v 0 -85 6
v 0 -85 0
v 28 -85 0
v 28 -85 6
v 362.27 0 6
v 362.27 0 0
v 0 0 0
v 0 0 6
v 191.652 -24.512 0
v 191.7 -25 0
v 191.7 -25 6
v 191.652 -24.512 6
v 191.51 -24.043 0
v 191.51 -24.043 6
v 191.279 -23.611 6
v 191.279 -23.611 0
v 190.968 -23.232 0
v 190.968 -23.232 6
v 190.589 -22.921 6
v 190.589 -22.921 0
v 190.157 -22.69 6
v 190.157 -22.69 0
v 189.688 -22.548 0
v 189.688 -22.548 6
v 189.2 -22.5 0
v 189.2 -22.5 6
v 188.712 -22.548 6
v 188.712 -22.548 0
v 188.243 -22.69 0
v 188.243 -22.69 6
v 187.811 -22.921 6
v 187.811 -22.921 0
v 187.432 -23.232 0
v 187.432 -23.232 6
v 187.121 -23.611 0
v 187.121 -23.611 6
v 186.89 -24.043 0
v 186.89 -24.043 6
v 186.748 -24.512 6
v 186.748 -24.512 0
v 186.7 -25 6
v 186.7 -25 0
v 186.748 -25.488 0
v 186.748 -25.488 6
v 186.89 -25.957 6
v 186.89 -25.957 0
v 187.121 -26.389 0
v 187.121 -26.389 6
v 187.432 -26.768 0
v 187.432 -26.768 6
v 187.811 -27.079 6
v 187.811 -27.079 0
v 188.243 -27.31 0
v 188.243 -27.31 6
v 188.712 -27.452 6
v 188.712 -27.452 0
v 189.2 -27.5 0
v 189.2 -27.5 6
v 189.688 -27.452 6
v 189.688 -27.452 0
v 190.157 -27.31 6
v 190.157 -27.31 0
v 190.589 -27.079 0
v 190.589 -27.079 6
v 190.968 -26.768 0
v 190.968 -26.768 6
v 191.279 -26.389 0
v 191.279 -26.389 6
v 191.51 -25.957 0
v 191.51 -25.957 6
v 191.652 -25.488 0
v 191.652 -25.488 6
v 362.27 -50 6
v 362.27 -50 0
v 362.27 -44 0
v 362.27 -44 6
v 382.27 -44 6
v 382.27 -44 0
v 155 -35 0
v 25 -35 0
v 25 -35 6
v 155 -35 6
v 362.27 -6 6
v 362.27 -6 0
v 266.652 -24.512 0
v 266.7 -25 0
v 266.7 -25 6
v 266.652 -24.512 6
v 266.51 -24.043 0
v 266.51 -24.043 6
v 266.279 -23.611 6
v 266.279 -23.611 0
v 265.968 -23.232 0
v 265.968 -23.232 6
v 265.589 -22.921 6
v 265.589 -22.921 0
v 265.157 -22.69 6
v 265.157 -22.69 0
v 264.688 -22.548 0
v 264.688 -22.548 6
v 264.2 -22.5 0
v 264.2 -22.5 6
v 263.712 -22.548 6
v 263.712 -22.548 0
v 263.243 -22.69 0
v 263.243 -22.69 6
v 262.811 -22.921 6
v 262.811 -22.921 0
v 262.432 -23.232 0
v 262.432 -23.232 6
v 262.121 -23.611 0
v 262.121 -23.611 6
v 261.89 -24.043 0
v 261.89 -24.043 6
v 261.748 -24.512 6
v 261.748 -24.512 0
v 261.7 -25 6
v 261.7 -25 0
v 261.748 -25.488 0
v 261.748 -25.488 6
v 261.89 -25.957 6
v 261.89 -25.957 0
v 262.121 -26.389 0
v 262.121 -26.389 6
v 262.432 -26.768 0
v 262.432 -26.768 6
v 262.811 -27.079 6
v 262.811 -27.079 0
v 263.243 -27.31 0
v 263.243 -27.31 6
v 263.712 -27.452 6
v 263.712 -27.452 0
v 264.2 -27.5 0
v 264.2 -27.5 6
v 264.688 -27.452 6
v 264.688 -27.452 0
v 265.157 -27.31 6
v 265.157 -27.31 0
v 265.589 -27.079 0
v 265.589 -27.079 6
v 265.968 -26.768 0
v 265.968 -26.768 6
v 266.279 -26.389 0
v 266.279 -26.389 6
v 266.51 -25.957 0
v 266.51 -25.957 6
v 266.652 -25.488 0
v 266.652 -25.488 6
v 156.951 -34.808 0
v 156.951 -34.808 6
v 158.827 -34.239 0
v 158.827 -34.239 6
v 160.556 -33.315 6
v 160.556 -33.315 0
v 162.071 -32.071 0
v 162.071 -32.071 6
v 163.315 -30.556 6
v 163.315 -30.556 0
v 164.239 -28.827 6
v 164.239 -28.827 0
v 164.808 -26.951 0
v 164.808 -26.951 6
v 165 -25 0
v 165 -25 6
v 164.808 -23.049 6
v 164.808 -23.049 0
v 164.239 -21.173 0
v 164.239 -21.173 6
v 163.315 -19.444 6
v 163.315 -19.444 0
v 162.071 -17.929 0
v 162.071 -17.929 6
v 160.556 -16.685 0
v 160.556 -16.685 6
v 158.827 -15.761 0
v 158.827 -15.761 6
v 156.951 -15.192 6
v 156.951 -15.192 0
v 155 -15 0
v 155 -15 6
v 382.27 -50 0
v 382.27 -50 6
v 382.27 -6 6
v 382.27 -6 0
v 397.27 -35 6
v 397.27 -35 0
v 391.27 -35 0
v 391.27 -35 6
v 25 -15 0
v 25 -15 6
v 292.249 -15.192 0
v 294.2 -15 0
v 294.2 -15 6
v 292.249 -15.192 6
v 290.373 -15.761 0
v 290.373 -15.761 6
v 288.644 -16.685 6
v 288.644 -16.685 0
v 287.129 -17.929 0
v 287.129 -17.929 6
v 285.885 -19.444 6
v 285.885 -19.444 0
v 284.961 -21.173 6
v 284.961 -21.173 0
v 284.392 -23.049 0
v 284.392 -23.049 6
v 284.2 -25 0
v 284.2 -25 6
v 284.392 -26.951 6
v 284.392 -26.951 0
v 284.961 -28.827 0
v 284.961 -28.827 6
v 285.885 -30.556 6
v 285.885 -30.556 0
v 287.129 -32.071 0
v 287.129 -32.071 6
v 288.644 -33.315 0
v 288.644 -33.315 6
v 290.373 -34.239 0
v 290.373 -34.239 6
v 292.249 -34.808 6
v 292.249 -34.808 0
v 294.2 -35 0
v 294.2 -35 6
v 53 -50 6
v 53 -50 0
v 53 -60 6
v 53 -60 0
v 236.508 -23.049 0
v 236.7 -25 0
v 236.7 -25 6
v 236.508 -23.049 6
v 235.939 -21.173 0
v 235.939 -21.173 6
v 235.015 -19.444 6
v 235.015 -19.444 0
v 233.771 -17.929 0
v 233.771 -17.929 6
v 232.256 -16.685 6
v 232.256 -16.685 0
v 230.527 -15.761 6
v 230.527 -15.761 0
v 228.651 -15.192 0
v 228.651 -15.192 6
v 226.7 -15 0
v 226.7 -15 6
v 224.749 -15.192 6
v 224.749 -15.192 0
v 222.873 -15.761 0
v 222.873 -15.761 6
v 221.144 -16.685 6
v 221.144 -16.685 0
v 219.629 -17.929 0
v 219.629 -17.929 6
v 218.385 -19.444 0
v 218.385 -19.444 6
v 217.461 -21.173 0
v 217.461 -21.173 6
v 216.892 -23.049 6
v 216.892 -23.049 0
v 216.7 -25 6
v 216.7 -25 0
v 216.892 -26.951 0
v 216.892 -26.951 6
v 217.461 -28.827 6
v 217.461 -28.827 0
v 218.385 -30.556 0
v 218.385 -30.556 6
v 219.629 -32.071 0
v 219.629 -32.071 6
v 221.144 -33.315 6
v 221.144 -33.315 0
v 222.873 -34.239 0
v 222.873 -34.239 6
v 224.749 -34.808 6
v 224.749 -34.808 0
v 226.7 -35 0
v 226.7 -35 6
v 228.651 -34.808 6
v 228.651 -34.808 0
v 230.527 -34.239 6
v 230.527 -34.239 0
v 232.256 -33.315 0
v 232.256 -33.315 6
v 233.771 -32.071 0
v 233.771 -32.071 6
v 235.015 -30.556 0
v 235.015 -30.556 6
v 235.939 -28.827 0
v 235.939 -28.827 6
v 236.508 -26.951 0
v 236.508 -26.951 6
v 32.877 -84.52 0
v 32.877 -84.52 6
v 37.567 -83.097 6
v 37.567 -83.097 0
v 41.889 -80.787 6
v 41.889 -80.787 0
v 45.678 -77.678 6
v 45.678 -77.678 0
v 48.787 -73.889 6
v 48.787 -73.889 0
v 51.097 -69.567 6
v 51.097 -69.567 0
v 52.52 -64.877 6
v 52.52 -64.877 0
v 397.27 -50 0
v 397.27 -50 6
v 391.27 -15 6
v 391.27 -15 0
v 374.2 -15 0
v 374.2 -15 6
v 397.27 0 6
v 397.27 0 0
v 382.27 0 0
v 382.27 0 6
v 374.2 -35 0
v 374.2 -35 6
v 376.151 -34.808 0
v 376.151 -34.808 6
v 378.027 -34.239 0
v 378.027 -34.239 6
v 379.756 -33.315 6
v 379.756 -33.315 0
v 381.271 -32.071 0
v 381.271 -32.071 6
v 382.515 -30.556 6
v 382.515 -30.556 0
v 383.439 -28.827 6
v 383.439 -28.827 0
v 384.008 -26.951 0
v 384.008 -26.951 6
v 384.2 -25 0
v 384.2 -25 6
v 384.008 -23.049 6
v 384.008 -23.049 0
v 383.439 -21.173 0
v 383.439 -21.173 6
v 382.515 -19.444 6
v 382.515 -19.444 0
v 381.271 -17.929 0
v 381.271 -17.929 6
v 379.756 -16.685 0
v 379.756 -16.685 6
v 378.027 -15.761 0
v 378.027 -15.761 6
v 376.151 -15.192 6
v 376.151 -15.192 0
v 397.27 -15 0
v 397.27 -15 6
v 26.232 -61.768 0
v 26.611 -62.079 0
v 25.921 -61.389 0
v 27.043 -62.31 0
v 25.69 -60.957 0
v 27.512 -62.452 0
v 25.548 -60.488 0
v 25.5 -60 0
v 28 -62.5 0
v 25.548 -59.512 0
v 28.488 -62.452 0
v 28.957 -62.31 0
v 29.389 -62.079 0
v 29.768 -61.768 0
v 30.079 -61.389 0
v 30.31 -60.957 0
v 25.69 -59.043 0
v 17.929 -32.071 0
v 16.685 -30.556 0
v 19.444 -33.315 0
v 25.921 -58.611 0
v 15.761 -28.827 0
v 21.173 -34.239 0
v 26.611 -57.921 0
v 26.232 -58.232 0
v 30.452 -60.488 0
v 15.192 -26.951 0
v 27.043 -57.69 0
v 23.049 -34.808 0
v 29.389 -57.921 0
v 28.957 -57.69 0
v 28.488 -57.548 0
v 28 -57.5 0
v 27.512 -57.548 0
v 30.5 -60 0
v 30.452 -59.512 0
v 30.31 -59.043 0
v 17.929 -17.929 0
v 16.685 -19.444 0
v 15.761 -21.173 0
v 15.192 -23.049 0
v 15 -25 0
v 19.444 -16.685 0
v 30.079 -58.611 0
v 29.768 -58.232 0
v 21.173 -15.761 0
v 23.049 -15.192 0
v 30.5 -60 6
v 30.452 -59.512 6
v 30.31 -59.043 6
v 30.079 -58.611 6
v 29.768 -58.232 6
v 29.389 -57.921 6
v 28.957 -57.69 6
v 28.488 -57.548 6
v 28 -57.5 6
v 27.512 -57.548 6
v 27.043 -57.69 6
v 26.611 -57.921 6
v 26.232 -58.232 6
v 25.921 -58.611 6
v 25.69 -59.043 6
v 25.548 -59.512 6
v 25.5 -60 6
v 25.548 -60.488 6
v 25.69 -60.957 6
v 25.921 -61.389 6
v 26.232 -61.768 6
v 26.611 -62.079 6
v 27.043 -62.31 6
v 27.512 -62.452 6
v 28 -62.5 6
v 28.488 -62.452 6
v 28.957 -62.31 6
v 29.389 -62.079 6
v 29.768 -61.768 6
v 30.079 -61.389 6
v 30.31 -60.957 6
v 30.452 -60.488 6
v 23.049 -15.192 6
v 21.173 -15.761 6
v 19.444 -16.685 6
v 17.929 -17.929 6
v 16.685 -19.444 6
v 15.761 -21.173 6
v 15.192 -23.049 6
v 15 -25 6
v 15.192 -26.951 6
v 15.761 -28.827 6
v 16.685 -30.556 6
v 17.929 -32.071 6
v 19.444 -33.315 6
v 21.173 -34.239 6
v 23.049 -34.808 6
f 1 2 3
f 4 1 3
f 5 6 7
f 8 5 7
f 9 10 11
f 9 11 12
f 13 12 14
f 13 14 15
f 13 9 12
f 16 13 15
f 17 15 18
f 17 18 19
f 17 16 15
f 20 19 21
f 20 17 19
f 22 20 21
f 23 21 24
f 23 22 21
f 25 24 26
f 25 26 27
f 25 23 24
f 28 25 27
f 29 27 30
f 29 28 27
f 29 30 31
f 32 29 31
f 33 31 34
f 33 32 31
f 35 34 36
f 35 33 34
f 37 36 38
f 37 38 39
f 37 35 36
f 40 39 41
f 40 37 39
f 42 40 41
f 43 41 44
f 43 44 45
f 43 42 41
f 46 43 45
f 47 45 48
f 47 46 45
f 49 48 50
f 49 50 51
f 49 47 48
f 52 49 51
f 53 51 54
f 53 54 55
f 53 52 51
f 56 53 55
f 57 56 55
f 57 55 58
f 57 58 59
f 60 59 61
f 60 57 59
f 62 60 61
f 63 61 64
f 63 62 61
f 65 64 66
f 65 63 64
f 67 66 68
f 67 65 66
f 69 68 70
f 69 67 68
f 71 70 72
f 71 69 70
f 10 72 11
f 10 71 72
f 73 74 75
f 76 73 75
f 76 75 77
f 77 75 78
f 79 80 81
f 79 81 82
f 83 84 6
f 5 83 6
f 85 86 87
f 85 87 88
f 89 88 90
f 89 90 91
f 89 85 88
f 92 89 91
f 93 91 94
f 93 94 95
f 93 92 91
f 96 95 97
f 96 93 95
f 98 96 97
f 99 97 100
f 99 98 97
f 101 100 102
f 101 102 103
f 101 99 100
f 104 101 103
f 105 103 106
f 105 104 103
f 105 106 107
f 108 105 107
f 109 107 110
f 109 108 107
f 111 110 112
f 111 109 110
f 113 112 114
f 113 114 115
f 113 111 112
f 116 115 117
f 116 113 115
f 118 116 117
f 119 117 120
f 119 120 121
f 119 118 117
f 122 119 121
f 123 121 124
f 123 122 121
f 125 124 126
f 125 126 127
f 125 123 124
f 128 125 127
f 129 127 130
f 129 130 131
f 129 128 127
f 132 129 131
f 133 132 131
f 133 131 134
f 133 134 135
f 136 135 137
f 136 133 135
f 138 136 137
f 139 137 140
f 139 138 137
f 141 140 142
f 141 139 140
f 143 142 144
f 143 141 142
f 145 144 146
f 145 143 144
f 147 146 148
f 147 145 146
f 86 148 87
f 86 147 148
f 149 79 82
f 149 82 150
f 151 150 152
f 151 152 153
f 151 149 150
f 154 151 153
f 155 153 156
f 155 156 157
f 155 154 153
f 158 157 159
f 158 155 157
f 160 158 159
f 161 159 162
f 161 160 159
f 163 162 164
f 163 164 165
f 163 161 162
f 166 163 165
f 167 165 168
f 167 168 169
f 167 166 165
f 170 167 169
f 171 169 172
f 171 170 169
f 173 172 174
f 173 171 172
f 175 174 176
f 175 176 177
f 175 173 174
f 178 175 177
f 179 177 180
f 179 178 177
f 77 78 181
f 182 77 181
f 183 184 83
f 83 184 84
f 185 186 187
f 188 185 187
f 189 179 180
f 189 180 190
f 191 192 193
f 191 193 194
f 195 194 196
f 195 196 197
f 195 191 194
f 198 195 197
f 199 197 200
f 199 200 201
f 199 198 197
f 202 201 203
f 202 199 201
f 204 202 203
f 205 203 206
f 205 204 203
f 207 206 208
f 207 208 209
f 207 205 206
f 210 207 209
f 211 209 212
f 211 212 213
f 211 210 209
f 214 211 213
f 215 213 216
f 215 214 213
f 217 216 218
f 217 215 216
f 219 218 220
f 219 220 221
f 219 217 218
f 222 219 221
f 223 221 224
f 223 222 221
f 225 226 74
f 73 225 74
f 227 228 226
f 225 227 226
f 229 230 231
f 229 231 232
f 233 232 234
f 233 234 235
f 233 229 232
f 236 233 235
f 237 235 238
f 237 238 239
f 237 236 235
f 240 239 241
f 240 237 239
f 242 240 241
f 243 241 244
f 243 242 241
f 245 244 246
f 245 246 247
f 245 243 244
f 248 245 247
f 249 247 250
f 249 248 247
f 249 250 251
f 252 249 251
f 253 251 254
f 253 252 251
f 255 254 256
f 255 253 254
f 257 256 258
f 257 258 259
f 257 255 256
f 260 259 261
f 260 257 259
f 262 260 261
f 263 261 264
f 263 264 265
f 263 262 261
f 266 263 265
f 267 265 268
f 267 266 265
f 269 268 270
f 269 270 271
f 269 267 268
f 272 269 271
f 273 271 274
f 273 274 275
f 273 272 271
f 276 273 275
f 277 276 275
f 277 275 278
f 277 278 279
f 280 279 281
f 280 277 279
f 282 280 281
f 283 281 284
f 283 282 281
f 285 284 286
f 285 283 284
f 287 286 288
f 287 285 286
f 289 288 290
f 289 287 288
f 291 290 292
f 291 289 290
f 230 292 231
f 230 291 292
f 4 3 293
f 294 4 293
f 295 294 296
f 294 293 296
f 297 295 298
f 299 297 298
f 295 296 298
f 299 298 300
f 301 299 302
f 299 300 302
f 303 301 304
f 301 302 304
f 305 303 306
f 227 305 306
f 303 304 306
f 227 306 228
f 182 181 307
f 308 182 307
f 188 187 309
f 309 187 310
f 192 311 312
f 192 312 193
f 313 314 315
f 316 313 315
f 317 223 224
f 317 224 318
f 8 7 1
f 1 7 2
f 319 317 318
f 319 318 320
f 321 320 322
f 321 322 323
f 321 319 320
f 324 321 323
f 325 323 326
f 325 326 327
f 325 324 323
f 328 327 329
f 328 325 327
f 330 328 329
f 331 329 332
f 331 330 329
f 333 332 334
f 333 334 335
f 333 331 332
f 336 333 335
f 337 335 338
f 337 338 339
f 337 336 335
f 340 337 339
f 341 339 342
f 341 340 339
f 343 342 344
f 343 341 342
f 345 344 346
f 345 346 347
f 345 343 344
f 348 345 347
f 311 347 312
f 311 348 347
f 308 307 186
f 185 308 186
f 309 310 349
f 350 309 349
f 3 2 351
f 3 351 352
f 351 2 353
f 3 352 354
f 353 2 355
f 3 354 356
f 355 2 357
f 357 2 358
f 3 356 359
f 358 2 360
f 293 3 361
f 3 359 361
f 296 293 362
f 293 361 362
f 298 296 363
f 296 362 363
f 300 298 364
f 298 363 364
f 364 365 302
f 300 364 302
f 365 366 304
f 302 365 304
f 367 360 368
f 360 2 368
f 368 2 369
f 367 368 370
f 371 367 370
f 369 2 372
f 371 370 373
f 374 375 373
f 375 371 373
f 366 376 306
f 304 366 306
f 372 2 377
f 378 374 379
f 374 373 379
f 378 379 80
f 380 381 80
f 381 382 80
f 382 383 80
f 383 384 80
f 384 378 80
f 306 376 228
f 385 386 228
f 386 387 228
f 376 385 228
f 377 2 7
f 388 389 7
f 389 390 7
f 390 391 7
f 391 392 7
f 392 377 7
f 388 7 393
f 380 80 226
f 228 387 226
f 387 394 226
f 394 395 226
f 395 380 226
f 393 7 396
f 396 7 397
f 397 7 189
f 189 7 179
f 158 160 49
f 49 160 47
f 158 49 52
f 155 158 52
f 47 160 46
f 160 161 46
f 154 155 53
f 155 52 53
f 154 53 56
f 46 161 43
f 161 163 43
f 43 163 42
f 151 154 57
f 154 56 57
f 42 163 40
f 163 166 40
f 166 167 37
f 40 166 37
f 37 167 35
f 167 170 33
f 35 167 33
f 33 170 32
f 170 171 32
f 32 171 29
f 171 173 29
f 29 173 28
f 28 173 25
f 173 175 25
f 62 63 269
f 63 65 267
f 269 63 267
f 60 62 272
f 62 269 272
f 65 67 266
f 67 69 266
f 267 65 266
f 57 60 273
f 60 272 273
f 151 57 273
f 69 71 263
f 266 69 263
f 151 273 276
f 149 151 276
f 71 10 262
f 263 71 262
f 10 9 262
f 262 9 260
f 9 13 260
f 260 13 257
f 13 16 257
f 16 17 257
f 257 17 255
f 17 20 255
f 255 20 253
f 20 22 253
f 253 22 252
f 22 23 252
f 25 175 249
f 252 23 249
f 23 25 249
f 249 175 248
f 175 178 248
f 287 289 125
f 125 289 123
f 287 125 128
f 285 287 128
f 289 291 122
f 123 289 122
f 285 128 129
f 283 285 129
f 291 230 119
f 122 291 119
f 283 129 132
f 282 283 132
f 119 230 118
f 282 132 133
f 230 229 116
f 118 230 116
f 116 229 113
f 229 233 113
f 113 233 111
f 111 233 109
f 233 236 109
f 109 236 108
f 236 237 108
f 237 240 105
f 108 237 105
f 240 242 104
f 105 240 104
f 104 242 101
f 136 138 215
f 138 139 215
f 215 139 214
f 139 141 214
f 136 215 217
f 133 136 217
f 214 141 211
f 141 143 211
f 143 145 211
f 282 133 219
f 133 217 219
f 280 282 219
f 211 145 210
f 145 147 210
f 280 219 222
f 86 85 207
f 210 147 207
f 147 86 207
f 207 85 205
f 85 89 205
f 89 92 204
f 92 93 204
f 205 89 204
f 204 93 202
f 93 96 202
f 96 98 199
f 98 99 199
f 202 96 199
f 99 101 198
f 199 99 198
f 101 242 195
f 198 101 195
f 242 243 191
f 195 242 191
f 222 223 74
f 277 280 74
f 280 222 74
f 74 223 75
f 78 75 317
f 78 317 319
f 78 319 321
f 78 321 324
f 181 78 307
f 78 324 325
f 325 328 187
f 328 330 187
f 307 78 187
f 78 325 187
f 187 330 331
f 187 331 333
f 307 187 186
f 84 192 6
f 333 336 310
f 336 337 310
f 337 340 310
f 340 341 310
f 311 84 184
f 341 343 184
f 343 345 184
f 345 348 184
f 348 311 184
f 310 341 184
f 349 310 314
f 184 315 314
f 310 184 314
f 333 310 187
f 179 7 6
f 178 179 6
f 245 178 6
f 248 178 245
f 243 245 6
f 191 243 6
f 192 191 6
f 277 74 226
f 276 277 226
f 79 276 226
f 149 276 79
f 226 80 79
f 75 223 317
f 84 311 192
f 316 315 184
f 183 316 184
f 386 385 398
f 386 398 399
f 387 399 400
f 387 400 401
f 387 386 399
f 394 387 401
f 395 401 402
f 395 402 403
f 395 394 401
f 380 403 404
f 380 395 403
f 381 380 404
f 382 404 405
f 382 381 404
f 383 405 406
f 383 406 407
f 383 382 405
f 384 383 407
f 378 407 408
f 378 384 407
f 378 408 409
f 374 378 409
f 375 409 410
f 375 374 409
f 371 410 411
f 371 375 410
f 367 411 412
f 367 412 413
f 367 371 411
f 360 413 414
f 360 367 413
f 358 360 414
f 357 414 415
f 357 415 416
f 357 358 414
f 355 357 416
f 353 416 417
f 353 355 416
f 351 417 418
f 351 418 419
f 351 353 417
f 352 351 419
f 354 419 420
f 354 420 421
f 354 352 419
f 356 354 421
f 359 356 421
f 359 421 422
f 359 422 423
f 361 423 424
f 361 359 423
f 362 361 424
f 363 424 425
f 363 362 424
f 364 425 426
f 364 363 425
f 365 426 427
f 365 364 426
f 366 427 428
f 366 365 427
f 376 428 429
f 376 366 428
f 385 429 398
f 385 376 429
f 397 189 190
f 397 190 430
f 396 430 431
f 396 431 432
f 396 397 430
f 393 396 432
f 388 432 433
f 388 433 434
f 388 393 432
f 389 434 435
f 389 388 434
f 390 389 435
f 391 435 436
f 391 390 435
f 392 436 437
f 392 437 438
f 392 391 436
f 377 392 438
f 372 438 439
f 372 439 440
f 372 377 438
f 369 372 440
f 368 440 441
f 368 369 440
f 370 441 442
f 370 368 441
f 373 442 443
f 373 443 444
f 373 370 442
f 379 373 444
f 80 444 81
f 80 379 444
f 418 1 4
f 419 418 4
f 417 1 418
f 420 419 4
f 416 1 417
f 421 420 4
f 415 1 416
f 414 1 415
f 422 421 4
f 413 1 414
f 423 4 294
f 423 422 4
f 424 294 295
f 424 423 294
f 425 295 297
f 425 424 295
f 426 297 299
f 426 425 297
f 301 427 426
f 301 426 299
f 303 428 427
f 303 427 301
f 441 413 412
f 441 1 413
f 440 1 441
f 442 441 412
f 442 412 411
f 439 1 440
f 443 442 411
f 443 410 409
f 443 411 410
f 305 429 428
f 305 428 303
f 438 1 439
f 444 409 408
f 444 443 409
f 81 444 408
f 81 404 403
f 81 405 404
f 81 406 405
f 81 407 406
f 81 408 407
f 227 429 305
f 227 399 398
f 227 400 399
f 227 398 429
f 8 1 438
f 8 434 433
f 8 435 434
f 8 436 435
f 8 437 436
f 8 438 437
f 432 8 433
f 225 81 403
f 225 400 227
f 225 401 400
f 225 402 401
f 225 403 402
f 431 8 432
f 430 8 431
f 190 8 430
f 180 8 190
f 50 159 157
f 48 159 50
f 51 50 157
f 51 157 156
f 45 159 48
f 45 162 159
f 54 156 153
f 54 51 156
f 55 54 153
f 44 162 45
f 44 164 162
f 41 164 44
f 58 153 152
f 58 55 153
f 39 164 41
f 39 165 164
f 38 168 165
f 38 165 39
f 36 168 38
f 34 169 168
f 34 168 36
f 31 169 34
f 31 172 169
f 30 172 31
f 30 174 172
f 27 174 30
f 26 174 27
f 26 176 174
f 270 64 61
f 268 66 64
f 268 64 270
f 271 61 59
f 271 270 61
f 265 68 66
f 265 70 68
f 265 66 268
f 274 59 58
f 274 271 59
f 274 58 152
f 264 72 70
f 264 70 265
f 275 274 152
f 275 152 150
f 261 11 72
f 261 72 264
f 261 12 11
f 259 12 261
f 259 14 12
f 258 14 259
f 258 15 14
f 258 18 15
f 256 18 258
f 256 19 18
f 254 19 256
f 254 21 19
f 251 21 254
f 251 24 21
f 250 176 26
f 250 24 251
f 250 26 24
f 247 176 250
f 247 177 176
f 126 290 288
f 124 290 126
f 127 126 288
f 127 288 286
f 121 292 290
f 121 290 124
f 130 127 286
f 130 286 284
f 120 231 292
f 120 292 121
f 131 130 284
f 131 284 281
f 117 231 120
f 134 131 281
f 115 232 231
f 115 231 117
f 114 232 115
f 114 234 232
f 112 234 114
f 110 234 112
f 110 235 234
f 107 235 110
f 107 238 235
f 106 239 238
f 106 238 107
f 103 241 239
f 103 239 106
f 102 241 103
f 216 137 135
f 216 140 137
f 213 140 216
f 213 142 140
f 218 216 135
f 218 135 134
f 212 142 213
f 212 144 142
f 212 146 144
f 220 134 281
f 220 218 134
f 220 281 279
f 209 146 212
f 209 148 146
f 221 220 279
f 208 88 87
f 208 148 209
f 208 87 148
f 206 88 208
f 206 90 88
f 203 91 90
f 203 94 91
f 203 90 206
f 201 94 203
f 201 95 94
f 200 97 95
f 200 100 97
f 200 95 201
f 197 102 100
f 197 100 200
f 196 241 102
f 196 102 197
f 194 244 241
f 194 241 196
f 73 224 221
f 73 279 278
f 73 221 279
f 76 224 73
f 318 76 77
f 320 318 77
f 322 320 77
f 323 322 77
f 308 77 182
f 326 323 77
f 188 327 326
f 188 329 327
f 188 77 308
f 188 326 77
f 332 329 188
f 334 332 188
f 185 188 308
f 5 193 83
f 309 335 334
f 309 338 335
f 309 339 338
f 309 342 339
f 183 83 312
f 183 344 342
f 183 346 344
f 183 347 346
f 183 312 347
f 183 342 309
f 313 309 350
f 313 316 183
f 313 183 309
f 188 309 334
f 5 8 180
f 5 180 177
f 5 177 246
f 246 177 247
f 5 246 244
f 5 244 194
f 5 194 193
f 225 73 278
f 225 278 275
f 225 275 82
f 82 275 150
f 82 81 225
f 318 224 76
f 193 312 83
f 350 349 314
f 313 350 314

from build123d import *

# Parameters (mm, degrees)
SKETCH1_R           = 2.5
SKETCH1_R_2         = 10
BOSS_EXTRUDE1_DEPTH = 6


with BuildPart() as part:
    # Sketch1 → Boss-Extrude1 (new body)
    with BuildSketch(Plane.XY):
        with BuildLine():
            Line((397.27, -50), (397.27, -35))
            Line((397.27, -35), (391.27, -35))
            Line((391.27, -35), (391.27, -15))
            Line((391.27, -15), (397.27, -15))
            Line((397.27, -15), (397.27, 0))
            Line((397.27, 0), (382.27, 0))
            Line((382.27, 0), (382.27, -6))
            Line((382.27, -6), (362.27, -6))
            Line((362.27, -6), (362.27, 0))
            Line((362.27, 0), (0, 0))
            Line((0, 0), (0, -85))
            Line((0, -85), (28, -85))
            ThreePointArc((28, -85), (45.67766953, -77.67766953), (53, -60))
            Line((53, -60), (53, -50))
            Line((53, -50), (362.27, -50))
            Line((362.27, -50), (362.27, -44))
            Line((362.27, -44), (382.27, -44))
            Line((382.27, -44), (382.27, -50))
            Line((382.27, -50), (397.27, -50))
        make_face()
        with Locations((189.2, -25)):
            Circle(SKETCH1_R, mode=Mode.SUBTRACT)
        with Locations((226.7, -25)):
            Circle(SKETCH1_R_2, mode=Mode.SUBTRACT)
        with Locations((28, -60)):
            Circle(SKETCH1_R, mode=Mode.SUBTRACT)
        with Locations((264.2, -25)):
            Circle(SKETCH1_R, mode=Mode.SUBTRACT)
        with BuildLine():
            Line((25, -35), (155, -35))
            ThreePointArc((155, -35), (165, -25), (155, -15))
            Line((155, -15), (25, -15))
            ThreePointArc((25, -15), (15, -25), (25, -35))
        make_face(mode=Mode.SUBTRACT)
        with BuildLine():
            Line((294.2, -35), (374.2, -35))
            ThreePointArc((374.2, -35), (384.2, -25), (374.2, -15))
            Line((374.2, -15), (294.2, -15))
            ThreePointArc((294.2, -15), (284.2, -25), (294.2, -35))
        make_face(mode=Mode.SUBTRACT)
    extrude(amount=BOSS_EXTRUDE1_DEPTH)


solid = part.part
